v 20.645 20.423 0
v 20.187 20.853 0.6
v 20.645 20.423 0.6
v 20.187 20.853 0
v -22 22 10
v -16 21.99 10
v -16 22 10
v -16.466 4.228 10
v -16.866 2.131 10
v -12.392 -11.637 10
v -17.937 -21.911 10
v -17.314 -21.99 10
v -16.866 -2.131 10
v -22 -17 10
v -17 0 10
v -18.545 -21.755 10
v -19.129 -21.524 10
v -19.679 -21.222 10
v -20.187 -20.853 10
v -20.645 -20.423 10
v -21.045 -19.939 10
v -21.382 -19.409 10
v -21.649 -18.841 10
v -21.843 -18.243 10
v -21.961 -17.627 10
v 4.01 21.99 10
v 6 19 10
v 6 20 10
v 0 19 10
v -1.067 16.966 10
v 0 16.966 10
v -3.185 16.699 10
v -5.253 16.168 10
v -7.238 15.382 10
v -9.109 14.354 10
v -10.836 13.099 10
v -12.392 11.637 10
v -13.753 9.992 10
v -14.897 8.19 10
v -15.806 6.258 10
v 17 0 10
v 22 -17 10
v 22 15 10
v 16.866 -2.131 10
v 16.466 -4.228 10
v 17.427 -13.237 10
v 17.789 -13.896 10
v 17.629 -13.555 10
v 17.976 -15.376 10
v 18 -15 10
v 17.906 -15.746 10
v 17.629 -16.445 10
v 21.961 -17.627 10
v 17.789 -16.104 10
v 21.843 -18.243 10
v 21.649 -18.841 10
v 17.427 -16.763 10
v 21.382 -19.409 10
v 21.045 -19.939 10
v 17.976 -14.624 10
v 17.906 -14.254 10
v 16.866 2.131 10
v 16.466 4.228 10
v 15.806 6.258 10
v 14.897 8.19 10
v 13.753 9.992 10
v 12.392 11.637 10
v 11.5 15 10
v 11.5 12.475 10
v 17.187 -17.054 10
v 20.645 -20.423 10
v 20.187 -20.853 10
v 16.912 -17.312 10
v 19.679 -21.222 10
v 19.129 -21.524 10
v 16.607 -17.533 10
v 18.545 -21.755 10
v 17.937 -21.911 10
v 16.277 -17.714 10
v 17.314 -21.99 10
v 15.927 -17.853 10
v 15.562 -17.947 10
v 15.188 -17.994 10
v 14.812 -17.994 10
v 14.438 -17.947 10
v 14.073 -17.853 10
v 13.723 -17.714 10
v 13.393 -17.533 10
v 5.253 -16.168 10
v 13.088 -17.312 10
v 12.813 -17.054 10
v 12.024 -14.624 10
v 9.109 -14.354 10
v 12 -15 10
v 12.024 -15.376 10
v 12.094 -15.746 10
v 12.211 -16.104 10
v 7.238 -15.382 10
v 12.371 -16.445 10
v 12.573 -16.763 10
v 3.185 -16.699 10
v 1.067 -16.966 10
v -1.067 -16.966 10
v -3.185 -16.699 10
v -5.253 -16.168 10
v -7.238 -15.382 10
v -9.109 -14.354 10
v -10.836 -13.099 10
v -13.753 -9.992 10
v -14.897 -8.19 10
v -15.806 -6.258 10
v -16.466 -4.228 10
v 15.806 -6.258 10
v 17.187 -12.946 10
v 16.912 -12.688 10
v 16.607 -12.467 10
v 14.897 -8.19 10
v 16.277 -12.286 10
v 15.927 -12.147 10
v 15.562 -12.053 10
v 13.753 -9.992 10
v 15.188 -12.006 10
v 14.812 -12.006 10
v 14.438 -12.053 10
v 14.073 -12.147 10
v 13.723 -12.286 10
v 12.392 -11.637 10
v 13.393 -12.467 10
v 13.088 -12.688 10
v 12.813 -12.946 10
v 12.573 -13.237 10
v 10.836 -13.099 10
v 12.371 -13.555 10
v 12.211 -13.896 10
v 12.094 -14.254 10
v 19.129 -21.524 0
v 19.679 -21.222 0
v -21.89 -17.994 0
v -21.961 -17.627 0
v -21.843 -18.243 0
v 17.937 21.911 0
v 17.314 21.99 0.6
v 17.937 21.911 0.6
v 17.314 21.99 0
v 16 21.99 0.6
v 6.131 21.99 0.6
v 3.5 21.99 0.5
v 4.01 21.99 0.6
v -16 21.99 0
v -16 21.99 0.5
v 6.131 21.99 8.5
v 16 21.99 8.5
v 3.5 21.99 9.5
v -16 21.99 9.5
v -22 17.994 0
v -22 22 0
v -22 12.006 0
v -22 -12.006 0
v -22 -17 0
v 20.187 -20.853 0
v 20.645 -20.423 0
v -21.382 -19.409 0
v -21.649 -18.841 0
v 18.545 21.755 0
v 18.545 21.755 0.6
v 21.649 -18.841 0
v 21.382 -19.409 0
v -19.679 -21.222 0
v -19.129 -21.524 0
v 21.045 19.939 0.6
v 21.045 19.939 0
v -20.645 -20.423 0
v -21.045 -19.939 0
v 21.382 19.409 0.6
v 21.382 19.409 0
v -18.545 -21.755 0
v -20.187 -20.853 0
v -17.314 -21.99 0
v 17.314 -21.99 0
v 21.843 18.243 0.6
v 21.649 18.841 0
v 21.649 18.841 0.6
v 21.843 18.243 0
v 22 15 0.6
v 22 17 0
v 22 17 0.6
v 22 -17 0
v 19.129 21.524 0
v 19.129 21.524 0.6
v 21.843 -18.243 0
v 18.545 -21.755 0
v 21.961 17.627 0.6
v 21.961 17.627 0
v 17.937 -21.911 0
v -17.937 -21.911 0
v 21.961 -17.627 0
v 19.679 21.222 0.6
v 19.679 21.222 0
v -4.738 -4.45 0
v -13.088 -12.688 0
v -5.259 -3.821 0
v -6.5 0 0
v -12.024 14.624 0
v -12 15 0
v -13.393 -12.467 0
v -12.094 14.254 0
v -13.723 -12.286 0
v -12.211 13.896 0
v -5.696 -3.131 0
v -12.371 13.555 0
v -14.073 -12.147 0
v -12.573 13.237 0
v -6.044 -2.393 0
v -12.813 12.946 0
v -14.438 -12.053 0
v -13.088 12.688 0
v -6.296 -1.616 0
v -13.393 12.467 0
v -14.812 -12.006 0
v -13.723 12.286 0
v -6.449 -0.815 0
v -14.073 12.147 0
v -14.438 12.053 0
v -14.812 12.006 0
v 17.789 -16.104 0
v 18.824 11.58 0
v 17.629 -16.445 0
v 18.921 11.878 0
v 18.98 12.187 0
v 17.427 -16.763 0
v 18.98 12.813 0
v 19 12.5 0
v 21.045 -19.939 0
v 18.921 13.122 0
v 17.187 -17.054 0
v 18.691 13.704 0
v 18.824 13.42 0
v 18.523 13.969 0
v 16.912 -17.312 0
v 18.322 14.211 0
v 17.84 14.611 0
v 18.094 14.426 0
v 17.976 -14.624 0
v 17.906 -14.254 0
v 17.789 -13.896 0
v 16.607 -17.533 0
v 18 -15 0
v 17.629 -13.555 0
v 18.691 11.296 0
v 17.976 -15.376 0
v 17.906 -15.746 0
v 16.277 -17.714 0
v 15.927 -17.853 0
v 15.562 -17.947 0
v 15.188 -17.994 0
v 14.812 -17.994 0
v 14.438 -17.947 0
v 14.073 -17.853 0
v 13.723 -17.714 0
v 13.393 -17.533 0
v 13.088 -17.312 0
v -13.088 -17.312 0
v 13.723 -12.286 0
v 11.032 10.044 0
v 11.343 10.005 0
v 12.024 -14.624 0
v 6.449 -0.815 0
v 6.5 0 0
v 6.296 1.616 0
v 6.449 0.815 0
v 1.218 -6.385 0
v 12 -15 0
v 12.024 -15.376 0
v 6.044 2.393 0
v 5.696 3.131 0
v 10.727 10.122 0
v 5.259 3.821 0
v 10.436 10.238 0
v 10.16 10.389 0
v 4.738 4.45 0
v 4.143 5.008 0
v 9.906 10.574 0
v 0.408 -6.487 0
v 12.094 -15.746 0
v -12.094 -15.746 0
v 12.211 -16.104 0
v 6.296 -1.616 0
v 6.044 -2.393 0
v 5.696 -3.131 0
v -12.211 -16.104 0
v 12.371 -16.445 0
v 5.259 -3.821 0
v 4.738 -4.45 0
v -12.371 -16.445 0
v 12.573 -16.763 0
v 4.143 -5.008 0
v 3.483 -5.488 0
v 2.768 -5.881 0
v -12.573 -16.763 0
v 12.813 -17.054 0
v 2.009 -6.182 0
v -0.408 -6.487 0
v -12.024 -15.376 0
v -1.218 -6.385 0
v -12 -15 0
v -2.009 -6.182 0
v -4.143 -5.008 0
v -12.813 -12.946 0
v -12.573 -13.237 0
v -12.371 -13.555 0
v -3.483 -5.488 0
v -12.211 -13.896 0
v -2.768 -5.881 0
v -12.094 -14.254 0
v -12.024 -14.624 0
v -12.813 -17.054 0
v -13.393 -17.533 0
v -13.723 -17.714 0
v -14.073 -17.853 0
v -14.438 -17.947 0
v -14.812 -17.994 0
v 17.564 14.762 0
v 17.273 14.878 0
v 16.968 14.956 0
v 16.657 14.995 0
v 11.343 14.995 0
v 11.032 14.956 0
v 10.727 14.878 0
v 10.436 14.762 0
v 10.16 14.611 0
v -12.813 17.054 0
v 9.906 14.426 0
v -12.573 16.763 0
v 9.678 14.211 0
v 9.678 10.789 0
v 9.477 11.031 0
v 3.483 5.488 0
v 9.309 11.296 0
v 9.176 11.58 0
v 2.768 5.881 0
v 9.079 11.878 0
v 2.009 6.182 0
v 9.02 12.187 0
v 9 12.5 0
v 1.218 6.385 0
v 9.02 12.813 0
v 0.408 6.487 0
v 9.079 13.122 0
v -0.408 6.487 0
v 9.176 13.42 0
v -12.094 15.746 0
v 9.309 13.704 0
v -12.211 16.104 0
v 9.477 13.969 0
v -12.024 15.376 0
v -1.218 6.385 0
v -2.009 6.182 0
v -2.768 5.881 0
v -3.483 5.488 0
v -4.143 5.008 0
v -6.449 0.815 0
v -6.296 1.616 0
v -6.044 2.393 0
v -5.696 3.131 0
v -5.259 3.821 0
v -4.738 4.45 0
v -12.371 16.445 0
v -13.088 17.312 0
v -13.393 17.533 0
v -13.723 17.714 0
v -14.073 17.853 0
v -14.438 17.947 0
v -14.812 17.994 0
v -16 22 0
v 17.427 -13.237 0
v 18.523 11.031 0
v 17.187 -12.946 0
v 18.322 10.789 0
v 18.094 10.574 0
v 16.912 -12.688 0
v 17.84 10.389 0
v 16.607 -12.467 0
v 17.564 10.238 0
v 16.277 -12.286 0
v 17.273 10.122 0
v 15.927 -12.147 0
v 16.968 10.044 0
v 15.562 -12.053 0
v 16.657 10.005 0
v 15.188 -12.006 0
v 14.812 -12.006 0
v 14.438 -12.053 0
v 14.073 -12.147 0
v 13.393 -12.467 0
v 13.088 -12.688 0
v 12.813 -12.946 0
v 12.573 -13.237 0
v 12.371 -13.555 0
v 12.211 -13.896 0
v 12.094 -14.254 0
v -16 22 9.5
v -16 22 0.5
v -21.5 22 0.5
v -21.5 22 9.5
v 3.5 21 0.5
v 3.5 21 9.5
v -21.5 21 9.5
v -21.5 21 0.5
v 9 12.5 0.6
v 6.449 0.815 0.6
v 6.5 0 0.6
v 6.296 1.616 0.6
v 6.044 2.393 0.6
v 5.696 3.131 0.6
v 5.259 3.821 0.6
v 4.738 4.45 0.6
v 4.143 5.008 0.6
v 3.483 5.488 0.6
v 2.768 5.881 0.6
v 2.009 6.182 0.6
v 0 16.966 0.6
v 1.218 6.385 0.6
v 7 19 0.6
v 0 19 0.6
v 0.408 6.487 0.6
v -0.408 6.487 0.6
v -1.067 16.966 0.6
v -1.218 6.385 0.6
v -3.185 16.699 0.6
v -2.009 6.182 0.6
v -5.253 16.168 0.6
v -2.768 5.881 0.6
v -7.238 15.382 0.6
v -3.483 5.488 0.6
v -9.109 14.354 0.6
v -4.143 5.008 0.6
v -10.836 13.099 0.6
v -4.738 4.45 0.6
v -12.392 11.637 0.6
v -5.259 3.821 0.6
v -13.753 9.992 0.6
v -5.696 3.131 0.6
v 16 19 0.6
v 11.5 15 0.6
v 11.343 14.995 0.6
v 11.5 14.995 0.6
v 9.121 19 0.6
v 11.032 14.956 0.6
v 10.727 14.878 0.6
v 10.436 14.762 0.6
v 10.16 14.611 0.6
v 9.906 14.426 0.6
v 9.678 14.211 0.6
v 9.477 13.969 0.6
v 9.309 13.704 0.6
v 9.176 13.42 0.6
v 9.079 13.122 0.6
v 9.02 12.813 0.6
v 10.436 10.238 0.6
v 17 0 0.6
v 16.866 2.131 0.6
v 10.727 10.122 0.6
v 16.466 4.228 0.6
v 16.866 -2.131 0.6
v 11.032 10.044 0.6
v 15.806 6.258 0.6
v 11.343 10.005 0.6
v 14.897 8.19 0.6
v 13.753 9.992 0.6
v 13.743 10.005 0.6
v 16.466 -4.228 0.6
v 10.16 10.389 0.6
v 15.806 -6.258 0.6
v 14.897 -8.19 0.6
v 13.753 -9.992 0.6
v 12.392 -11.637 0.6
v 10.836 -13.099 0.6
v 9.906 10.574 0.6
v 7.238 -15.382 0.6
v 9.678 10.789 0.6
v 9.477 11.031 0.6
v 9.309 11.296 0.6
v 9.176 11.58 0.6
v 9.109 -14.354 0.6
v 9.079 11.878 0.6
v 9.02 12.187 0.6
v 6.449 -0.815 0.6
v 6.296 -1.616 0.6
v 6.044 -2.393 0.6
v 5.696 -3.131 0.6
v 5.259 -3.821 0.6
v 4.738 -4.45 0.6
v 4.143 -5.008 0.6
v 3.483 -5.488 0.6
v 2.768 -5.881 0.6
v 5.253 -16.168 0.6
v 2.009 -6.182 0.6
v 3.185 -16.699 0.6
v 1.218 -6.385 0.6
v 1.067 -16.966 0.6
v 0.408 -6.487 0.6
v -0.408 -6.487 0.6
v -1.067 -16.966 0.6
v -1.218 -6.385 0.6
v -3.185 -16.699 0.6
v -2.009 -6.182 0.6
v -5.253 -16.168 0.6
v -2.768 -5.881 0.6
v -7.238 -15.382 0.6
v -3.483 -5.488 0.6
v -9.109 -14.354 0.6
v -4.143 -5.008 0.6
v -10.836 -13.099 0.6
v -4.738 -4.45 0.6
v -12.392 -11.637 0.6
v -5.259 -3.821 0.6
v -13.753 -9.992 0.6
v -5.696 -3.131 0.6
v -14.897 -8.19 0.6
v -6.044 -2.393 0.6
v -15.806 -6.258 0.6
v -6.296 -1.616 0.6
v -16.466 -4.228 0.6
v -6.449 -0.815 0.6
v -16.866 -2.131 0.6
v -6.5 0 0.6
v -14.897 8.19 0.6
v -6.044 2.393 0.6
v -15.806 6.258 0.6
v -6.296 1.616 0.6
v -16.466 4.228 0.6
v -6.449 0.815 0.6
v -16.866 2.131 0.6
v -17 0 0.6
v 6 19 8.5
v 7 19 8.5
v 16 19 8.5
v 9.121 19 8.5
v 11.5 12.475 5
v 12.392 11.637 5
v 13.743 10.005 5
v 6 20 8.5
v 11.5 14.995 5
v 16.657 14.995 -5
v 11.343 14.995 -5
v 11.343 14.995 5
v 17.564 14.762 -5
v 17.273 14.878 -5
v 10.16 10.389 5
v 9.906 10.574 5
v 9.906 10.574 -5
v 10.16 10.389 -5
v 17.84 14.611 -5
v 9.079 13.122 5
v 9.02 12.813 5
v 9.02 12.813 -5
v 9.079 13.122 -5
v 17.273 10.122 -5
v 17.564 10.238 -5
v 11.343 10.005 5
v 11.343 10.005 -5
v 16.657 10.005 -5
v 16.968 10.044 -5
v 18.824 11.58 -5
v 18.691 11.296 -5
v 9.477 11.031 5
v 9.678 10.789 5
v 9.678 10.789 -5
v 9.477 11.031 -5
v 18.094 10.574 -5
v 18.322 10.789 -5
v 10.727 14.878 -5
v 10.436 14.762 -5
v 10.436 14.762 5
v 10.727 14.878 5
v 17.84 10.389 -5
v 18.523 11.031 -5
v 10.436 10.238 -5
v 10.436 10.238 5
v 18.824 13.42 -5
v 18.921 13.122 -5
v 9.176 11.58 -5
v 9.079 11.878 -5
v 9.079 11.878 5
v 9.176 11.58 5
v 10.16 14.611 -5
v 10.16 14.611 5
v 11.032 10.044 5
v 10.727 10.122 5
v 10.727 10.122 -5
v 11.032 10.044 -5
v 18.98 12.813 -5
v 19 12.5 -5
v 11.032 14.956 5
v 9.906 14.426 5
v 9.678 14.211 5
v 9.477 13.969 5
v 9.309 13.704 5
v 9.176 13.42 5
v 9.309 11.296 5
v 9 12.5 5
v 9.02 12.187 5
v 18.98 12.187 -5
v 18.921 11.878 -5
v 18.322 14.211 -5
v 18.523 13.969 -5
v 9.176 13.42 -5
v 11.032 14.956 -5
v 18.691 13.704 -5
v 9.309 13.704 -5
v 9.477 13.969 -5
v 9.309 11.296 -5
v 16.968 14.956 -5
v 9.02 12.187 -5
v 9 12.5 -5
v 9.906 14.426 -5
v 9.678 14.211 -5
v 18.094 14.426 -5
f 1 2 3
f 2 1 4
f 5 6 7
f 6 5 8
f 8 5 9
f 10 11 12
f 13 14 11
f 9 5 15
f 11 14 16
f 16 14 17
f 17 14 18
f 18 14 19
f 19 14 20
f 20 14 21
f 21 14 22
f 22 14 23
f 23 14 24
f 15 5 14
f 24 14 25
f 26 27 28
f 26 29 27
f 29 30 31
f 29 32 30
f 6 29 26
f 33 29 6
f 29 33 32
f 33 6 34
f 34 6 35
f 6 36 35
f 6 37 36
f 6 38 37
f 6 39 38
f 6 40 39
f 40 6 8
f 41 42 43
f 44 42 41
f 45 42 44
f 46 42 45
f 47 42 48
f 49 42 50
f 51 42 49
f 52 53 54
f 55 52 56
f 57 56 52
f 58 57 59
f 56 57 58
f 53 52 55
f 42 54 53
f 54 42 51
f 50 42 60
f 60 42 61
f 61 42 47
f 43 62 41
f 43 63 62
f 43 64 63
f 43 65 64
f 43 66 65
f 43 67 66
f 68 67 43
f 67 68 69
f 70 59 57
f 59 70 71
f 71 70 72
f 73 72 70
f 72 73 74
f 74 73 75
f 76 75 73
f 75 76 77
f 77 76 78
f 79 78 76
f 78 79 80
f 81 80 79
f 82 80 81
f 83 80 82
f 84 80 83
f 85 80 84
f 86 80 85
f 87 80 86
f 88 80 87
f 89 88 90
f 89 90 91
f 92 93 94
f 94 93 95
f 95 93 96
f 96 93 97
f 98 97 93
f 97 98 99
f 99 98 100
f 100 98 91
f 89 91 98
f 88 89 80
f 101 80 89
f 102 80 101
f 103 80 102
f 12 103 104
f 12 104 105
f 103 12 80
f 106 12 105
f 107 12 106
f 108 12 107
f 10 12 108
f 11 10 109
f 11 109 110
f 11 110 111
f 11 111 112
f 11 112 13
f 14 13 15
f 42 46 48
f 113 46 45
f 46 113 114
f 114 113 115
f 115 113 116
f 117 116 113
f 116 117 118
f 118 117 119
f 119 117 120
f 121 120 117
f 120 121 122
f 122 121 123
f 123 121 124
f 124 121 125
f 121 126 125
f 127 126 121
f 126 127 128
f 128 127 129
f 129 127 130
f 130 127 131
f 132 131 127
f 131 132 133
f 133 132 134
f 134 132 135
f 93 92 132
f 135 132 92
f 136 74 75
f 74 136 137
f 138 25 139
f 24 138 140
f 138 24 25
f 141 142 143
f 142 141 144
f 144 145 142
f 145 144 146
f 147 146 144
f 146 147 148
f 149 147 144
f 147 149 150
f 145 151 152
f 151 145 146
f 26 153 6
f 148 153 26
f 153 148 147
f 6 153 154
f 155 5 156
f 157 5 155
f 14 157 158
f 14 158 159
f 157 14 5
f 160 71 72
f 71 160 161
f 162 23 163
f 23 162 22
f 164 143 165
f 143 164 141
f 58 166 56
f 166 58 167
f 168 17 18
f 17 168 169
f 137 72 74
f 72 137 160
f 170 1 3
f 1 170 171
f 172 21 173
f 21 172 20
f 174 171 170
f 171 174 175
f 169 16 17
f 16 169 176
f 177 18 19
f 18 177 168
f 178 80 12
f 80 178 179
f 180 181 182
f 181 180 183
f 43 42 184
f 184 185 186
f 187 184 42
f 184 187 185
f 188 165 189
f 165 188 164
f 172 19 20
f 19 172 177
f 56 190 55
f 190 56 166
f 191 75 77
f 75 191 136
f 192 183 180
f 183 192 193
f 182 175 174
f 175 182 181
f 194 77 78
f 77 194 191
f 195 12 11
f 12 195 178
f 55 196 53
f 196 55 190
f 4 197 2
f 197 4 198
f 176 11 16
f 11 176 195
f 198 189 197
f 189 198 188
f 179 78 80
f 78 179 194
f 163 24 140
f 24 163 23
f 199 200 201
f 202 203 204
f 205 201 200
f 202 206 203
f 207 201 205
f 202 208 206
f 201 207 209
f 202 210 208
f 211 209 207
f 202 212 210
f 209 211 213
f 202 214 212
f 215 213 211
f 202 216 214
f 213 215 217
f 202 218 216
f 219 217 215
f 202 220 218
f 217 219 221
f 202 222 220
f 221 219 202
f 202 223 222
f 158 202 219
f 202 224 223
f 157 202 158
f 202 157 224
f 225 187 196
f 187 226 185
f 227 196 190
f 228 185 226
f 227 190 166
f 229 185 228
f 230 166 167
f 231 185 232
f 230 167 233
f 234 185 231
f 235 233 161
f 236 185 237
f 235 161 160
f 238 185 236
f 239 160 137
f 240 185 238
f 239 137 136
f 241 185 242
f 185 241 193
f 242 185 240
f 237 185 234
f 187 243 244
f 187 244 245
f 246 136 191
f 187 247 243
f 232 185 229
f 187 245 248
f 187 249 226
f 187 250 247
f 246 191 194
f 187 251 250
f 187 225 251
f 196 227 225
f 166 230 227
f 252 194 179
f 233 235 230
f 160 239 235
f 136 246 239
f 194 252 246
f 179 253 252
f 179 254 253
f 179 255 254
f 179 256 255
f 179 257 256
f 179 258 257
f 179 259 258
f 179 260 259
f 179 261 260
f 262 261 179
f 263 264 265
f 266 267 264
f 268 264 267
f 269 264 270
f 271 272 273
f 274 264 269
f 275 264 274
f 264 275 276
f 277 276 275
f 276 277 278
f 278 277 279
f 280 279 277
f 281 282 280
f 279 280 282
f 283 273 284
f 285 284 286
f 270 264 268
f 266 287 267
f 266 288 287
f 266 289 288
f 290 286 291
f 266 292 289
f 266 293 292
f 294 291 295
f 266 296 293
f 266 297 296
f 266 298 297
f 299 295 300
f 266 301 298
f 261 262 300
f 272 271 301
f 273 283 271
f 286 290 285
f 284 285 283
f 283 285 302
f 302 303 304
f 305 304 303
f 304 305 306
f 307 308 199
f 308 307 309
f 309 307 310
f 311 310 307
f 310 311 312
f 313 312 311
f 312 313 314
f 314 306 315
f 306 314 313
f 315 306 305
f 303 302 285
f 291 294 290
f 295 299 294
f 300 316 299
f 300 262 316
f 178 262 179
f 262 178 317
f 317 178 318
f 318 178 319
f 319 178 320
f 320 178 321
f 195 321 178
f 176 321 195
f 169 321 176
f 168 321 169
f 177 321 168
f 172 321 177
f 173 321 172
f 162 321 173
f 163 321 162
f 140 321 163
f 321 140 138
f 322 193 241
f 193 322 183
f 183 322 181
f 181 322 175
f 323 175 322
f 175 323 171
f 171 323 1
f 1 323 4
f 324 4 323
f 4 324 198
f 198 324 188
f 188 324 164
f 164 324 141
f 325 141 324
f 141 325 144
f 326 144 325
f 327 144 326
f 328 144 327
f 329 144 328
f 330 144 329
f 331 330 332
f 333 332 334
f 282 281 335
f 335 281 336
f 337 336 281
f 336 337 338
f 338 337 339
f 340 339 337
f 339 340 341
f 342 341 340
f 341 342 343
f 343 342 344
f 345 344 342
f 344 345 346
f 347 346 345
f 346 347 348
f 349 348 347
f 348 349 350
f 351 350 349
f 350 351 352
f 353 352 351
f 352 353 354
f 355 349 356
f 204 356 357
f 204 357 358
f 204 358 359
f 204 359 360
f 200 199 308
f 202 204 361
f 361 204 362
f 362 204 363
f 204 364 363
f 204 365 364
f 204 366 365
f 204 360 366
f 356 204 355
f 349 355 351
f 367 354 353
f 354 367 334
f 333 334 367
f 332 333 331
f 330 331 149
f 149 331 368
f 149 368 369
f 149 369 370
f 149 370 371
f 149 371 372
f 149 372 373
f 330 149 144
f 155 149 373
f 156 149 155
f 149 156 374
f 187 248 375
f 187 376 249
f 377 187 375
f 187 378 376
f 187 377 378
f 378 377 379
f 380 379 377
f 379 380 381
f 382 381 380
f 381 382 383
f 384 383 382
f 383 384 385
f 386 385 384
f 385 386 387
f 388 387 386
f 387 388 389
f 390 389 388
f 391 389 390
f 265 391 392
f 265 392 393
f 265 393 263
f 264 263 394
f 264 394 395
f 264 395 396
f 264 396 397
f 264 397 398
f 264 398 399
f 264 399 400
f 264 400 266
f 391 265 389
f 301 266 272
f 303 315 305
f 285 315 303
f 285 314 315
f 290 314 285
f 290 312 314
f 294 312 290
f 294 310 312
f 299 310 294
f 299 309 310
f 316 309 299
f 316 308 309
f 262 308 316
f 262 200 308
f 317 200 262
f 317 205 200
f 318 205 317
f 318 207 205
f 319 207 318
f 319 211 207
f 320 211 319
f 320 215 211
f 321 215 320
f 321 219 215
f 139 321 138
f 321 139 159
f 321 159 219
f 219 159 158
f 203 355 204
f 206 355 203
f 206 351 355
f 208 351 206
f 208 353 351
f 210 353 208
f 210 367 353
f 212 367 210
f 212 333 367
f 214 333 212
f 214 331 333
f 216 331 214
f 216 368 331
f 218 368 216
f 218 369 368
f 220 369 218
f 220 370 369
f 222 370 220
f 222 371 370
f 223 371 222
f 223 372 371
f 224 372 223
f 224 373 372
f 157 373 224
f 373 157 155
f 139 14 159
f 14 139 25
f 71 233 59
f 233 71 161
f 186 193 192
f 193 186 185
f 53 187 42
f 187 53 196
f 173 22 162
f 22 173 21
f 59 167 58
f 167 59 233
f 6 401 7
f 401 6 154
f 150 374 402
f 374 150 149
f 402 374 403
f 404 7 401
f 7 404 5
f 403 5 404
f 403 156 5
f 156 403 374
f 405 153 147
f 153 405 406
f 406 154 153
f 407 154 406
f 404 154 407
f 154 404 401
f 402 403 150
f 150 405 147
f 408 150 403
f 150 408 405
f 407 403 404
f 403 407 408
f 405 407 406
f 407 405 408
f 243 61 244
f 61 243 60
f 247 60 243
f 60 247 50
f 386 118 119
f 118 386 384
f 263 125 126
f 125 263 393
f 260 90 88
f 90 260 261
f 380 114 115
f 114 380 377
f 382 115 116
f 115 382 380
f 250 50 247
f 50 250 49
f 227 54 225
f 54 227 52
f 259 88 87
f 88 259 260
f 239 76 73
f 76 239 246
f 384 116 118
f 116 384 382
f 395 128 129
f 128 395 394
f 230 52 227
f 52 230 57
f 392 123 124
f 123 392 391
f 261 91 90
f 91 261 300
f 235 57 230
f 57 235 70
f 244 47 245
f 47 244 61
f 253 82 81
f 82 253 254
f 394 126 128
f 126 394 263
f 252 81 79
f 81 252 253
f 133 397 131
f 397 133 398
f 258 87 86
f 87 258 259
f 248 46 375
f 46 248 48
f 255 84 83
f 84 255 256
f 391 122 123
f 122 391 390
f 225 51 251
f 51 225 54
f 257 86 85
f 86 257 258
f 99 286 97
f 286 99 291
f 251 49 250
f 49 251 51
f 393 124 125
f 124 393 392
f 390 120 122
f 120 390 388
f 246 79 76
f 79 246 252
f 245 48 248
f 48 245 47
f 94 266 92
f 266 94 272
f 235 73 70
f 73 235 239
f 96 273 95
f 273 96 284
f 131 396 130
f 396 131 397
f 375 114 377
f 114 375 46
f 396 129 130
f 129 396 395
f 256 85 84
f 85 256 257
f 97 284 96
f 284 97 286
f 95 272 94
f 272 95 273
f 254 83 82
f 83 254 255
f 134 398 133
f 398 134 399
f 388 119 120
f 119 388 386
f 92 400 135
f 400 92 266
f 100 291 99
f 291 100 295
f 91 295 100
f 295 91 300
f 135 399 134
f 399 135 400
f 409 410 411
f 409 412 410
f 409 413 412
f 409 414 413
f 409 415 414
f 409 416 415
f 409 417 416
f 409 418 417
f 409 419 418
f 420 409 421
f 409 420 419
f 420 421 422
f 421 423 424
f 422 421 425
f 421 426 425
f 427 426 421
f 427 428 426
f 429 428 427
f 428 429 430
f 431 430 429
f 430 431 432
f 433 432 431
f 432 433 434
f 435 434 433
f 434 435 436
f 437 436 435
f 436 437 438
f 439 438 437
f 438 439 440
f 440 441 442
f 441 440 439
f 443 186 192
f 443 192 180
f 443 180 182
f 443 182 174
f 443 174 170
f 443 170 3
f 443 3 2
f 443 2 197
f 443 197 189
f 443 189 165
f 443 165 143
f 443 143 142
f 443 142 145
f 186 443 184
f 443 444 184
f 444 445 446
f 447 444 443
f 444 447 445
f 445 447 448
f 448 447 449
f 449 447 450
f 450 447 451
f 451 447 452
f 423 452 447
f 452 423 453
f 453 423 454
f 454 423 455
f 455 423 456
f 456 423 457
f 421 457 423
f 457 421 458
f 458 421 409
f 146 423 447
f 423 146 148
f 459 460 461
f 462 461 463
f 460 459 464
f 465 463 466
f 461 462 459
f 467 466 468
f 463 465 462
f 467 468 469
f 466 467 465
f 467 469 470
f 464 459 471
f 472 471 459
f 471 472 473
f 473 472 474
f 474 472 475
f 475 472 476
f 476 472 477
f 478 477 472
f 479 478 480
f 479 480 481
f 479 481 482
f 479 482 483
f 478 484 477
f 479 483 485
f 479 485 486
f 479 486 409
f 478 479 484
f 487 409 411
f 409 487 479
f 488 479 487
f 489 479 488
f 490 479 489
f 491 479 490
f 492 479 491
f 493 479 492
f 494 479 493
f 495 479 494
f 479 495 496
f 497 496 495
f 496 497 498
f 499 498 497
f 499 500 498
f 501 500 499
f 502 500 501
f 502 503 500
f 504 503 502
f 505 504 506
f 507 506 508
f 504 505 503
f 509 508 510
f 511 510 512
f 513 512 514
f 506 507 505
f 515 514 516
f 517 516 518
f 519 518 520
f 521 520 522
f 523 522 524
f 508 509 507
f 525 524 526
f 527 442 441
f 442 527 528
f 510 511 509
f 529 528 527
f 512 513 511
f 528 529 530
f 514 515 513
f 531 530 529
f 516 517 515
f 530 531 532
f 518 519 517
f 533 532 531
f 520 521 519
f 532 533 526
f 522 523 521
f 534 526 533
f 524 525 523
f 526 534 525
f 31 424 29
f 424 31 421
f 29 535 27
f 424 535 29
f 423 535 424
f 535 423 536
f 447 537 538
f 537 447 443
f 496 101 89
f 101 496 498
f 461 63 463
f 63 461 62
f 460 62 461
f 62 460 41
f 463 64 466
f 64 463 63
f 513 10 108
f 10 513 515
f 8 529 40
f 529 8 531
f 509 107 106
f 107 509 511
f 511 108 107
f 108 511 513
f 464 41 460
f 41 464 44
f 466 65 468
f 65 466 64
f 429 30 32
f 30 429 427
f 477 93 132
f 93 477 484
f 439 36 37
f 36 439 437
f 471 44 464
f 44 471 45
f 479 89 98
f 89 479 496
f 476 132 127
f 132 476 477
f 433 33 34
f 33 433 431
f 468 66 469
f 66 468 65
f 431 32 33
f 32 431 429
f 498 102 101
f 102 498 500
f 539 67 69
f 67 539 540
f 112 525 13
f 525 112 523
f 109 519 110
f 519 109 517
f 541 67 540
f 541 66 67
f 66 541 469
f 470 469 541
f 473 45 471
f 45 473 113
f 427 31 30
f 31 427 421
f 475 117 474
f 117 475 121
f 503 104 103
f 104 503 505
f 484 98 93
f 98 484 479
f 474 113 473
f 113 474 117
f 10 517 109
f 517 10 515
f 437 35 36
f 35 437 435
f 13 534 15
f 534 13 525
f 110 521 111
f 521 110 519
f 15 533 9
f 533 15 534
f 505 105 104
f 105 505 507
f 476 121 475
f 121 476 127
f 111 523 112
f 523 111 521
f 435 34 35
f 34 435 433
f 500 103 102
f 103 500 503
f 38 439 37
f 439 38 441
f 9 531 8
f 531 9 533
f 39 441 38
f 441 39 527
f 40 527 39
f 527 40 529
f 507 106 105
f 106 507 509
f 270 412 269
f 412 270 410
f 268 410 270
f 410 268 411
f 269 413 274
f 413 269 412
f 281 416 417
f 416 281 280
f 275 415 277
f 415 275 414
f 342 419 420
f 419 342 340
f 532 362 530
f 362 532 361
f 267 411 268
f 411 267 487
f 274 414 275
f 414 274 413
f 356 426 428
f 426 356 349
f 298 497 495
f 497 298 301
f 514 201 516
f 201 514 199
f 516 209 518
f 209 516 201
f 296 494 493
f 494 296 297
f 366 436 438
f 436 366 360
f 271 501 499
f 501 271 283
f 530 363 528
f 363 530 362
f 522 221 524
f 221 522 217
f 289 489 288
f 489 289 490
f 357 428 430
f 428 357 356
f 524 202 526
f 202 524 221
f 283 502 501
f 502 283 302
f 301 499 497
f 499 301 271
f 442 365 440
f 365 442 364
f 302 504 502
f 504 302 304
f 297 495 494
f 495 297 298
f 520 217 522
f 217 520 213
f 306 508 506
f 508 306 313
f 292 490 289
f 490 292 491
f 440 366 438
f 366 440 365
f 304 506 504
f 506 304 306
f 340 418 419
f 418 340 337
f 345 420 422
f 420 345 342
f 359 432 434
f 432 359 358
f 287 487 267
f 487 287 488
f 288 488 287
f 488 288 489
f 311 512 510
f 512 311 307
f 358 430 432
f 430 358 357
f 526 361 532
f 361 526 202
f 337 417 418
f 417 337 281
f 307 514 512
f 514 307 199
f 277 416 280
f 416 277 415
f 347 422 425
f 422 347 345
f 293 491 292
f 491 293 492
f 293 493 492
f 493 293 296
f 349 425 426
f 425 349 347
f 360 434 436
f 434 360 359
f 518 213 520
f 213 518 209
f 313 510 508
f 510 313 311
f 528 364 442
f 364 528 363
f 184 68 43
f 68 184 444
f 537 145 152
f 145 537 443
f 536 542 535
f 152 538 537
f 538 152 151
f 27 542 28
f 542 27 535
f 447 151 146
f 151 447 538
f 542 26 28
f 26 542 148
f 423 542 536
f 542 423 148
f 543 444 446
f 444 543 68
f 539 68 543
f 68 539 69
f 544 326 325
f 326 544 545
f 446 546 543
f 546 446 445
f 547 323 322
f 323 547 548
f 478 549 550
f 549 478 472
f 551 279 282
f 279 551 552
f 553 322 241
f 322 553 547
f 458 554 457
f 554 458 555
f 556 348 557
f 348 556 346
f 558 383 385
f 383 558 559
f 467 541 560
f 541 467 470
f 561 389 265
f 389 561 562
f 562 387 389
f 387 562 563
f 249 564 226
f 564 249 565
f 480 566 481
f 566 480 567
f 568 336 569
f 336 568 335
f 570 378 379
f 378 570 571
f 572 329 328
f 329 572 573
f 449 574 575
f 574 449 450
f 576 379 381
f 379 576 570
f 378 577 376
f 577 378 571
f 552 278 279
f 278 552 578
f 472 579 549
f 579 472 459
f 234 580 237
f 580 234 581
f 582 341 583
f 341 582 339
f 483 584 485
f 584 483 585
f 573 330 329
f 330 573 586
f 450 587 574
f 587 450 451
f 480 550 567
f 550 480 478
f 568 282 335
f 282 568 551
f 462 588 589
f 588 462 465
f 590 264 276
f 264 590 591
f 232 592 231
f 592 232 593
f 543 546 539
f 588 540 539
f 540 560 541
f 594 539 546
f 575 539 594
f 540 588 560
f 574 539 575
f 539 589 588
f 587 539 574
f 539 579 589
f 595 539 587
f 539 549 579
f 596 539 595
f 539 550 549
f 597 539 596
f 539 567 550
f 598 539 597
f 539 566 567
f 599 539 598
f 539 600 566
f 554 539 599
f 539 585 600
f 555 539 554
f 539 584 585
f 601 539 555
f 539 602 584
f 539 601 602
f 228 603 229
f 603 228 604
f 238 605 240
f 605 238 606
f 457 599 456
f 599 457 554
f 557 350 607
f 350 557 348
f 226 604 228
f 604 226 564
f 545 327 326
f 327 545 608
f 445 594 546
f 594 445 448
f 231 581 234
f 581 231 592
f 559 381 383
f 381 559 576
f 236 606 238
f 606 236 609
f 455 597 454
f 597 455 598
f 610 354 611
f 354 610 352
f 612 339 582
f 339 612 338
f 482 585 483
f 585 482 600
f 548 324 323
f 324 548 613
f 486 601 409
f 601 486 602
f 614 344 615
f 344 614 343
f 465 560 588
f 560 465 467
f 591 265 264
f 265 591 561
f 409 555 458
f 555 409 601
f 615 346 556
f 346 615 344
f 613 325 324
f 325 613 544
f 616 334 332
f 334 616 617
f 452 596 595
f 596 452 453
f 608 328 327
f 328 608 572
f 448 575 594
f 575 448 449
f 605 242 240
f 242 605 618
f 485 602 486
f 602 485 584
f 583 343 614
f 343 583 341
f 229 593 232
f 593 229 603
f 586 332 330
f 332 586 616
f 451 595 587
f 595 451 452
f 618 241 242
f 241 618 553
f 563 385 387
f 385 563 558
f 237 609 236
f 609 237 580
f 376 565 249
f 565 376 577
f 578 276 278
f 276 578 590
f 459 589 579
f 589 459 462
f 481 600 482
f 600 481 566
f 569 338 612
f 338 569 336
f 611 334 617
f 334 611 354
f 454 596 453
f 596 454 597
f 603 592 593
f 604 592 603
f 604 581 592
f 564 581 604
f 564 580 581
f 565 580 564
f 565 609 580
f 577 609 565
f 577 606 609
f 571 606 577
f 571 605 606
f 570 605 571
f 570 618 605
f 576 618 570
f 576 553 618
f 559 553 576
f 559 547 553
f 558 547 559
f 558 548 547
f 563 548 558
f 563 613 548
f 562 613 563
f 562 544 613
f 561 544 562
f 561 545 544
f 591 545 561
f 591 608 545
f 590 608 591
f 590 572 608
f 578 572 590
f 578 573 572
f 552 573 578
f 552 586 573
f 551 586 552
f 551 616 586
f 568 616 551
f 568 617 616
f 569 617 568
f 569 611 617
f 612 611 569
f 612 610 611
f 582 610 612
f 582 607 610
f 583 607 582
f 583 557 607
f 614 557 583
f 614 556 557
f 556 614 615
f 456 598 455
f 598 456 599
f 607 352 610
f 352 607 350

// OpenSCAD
$fn = 50;


union() {
	difference() {
		union() {
			hull() {
				translate(v = [-17.0000000000, 17.0000000000, 0]) {
					cylinder(h = 10, r = 5);
				}
				translate(v = [17.0000000000, 17.0000000000, 0]) {
					cylinder(h = 10, r = 5);
				}
				translate(v = [-17.0000000000, -17.0000000000, 0]) {
					cylinder(h = 10, r = 5);
				}
				translate(v = [17.0000000000, -17.0000000000, 0]) {
					cylinder(h = 10, r = 5);
				}
			}
			translate(v = [-22.0000000000, 16.0000000000, 0]) {
				cube(size = [6, 6, 10]);
			}
		}
		union() {
			translate(v = [-22.5000000000, -15.0000000000, -250.0000000000]) {
				rotate(a = [0, 0, 0]) {
					difference() {
						union() {
							hull() {
								translate(v = [7.5000000000, 0, 0]) {
									cylinder(h = 250, r = 3.0000000000, r1 = 3.0000000000, r2 = 3.0000000000);
								}
								translate(v = [-7.5000000000, 0, 0]) {
									cylinder(h = 250, r = 3.0000000000, r1 = 3.0000000000, r2 = 3.0000000000);
								}
							}
						}
						union();
					}
				}
			}
			translate(v = [-22.5000000000, 15.0000000000, -250.0000000000]) {
				rotate(a = [0, 0, 0]) {
					difference() {
						union() {
							hull() {
								translate(v = [7.5000000000, 0, 0]) {
									cylinder(h = 250, r = 3.0000000000, r1 = 3.0000000000, r2 = 3.0000000000);
								}
								translate(v = [-7.5000000000, 0, 0]) {
									cylinder(h = 250, r = 3.0000000000, r1 = 3.0000000000, r2 = 3.0000000000);
								}
							}
						}
						union();
					}
				}
			}
			translate(v = [-21.5000000000, 21.0000000000, 0.5000000000]) {
				cube(size = [25, 1, 9.0000000000]);
			}
			translate(v = [15.0000000000, -15.0000000000, 0]) {
				cylinder(h = 100, r = 3.0000000000);
			}
			translate(v = [0.0000000000, 11.0000000000, 0.6000000000]) {
				cube(size = [11, 8, 12.4000000000]);
			}
			translate(v = [0, 0, 0.6000000000]) {
				cylinder(h = 12.4000000000, r = 17.0000000000);
			}
			translate(v = [0, 0, -5.0000000000]) {
				cylinder(h = 10, r = 6.5000000000);
			}
			translate(v = [0.0000000000, 15.0000000000, 0.6000000000]) {
				cube(size = [22.0000000000, 4, 12.4000000000]);
			}
			translate(v = [16.0000000000, 15.0000000000, 0.6000000000]) {
				cube(size = [6, 7, 12.4000000000]);
			}
			translate(v = [6.0000000000, 15.0000000000, 8.5000000000]) {
				cube(size = [16, 7, 1.5000000000]);
			}
			translate(v = [3.2500000000, 22.7500000000, 0.6000000000]) {
				rotate(a = [0, 0, -45]) {
					cube(size = [7.5000000000, 1.5000000000, 12.4000000000]);
				}
			}
			translate(v = [2.5000000000, 10.0000000000, 0.6000000000]) {
				cube(size = [9.0000000000, 5, 9.4000000000]);
			}
		}
	}
	union() {
		translate(v = [14, 12.5000000000, -5.0000000000]) {
			rotate(a = [0, 0, 0]) {
				difference() {
					union() {
						#hull() {
							#translate(v = [2.5000000000, 0, 0]) {
								cylinder(h = 10, r = 2.5000000000, r1 = 2.5000000000, r2 = 2.5000000000);
							}
							#translate(v = [-2.5000000000, 0, 0]) {
								cylinder(h = 10, r = 2.5000000000, r1 = 2.5000000000, r2 = 2.5000000000);
							}
						}
					}
					union();
				}
			}
		}
	}
}
